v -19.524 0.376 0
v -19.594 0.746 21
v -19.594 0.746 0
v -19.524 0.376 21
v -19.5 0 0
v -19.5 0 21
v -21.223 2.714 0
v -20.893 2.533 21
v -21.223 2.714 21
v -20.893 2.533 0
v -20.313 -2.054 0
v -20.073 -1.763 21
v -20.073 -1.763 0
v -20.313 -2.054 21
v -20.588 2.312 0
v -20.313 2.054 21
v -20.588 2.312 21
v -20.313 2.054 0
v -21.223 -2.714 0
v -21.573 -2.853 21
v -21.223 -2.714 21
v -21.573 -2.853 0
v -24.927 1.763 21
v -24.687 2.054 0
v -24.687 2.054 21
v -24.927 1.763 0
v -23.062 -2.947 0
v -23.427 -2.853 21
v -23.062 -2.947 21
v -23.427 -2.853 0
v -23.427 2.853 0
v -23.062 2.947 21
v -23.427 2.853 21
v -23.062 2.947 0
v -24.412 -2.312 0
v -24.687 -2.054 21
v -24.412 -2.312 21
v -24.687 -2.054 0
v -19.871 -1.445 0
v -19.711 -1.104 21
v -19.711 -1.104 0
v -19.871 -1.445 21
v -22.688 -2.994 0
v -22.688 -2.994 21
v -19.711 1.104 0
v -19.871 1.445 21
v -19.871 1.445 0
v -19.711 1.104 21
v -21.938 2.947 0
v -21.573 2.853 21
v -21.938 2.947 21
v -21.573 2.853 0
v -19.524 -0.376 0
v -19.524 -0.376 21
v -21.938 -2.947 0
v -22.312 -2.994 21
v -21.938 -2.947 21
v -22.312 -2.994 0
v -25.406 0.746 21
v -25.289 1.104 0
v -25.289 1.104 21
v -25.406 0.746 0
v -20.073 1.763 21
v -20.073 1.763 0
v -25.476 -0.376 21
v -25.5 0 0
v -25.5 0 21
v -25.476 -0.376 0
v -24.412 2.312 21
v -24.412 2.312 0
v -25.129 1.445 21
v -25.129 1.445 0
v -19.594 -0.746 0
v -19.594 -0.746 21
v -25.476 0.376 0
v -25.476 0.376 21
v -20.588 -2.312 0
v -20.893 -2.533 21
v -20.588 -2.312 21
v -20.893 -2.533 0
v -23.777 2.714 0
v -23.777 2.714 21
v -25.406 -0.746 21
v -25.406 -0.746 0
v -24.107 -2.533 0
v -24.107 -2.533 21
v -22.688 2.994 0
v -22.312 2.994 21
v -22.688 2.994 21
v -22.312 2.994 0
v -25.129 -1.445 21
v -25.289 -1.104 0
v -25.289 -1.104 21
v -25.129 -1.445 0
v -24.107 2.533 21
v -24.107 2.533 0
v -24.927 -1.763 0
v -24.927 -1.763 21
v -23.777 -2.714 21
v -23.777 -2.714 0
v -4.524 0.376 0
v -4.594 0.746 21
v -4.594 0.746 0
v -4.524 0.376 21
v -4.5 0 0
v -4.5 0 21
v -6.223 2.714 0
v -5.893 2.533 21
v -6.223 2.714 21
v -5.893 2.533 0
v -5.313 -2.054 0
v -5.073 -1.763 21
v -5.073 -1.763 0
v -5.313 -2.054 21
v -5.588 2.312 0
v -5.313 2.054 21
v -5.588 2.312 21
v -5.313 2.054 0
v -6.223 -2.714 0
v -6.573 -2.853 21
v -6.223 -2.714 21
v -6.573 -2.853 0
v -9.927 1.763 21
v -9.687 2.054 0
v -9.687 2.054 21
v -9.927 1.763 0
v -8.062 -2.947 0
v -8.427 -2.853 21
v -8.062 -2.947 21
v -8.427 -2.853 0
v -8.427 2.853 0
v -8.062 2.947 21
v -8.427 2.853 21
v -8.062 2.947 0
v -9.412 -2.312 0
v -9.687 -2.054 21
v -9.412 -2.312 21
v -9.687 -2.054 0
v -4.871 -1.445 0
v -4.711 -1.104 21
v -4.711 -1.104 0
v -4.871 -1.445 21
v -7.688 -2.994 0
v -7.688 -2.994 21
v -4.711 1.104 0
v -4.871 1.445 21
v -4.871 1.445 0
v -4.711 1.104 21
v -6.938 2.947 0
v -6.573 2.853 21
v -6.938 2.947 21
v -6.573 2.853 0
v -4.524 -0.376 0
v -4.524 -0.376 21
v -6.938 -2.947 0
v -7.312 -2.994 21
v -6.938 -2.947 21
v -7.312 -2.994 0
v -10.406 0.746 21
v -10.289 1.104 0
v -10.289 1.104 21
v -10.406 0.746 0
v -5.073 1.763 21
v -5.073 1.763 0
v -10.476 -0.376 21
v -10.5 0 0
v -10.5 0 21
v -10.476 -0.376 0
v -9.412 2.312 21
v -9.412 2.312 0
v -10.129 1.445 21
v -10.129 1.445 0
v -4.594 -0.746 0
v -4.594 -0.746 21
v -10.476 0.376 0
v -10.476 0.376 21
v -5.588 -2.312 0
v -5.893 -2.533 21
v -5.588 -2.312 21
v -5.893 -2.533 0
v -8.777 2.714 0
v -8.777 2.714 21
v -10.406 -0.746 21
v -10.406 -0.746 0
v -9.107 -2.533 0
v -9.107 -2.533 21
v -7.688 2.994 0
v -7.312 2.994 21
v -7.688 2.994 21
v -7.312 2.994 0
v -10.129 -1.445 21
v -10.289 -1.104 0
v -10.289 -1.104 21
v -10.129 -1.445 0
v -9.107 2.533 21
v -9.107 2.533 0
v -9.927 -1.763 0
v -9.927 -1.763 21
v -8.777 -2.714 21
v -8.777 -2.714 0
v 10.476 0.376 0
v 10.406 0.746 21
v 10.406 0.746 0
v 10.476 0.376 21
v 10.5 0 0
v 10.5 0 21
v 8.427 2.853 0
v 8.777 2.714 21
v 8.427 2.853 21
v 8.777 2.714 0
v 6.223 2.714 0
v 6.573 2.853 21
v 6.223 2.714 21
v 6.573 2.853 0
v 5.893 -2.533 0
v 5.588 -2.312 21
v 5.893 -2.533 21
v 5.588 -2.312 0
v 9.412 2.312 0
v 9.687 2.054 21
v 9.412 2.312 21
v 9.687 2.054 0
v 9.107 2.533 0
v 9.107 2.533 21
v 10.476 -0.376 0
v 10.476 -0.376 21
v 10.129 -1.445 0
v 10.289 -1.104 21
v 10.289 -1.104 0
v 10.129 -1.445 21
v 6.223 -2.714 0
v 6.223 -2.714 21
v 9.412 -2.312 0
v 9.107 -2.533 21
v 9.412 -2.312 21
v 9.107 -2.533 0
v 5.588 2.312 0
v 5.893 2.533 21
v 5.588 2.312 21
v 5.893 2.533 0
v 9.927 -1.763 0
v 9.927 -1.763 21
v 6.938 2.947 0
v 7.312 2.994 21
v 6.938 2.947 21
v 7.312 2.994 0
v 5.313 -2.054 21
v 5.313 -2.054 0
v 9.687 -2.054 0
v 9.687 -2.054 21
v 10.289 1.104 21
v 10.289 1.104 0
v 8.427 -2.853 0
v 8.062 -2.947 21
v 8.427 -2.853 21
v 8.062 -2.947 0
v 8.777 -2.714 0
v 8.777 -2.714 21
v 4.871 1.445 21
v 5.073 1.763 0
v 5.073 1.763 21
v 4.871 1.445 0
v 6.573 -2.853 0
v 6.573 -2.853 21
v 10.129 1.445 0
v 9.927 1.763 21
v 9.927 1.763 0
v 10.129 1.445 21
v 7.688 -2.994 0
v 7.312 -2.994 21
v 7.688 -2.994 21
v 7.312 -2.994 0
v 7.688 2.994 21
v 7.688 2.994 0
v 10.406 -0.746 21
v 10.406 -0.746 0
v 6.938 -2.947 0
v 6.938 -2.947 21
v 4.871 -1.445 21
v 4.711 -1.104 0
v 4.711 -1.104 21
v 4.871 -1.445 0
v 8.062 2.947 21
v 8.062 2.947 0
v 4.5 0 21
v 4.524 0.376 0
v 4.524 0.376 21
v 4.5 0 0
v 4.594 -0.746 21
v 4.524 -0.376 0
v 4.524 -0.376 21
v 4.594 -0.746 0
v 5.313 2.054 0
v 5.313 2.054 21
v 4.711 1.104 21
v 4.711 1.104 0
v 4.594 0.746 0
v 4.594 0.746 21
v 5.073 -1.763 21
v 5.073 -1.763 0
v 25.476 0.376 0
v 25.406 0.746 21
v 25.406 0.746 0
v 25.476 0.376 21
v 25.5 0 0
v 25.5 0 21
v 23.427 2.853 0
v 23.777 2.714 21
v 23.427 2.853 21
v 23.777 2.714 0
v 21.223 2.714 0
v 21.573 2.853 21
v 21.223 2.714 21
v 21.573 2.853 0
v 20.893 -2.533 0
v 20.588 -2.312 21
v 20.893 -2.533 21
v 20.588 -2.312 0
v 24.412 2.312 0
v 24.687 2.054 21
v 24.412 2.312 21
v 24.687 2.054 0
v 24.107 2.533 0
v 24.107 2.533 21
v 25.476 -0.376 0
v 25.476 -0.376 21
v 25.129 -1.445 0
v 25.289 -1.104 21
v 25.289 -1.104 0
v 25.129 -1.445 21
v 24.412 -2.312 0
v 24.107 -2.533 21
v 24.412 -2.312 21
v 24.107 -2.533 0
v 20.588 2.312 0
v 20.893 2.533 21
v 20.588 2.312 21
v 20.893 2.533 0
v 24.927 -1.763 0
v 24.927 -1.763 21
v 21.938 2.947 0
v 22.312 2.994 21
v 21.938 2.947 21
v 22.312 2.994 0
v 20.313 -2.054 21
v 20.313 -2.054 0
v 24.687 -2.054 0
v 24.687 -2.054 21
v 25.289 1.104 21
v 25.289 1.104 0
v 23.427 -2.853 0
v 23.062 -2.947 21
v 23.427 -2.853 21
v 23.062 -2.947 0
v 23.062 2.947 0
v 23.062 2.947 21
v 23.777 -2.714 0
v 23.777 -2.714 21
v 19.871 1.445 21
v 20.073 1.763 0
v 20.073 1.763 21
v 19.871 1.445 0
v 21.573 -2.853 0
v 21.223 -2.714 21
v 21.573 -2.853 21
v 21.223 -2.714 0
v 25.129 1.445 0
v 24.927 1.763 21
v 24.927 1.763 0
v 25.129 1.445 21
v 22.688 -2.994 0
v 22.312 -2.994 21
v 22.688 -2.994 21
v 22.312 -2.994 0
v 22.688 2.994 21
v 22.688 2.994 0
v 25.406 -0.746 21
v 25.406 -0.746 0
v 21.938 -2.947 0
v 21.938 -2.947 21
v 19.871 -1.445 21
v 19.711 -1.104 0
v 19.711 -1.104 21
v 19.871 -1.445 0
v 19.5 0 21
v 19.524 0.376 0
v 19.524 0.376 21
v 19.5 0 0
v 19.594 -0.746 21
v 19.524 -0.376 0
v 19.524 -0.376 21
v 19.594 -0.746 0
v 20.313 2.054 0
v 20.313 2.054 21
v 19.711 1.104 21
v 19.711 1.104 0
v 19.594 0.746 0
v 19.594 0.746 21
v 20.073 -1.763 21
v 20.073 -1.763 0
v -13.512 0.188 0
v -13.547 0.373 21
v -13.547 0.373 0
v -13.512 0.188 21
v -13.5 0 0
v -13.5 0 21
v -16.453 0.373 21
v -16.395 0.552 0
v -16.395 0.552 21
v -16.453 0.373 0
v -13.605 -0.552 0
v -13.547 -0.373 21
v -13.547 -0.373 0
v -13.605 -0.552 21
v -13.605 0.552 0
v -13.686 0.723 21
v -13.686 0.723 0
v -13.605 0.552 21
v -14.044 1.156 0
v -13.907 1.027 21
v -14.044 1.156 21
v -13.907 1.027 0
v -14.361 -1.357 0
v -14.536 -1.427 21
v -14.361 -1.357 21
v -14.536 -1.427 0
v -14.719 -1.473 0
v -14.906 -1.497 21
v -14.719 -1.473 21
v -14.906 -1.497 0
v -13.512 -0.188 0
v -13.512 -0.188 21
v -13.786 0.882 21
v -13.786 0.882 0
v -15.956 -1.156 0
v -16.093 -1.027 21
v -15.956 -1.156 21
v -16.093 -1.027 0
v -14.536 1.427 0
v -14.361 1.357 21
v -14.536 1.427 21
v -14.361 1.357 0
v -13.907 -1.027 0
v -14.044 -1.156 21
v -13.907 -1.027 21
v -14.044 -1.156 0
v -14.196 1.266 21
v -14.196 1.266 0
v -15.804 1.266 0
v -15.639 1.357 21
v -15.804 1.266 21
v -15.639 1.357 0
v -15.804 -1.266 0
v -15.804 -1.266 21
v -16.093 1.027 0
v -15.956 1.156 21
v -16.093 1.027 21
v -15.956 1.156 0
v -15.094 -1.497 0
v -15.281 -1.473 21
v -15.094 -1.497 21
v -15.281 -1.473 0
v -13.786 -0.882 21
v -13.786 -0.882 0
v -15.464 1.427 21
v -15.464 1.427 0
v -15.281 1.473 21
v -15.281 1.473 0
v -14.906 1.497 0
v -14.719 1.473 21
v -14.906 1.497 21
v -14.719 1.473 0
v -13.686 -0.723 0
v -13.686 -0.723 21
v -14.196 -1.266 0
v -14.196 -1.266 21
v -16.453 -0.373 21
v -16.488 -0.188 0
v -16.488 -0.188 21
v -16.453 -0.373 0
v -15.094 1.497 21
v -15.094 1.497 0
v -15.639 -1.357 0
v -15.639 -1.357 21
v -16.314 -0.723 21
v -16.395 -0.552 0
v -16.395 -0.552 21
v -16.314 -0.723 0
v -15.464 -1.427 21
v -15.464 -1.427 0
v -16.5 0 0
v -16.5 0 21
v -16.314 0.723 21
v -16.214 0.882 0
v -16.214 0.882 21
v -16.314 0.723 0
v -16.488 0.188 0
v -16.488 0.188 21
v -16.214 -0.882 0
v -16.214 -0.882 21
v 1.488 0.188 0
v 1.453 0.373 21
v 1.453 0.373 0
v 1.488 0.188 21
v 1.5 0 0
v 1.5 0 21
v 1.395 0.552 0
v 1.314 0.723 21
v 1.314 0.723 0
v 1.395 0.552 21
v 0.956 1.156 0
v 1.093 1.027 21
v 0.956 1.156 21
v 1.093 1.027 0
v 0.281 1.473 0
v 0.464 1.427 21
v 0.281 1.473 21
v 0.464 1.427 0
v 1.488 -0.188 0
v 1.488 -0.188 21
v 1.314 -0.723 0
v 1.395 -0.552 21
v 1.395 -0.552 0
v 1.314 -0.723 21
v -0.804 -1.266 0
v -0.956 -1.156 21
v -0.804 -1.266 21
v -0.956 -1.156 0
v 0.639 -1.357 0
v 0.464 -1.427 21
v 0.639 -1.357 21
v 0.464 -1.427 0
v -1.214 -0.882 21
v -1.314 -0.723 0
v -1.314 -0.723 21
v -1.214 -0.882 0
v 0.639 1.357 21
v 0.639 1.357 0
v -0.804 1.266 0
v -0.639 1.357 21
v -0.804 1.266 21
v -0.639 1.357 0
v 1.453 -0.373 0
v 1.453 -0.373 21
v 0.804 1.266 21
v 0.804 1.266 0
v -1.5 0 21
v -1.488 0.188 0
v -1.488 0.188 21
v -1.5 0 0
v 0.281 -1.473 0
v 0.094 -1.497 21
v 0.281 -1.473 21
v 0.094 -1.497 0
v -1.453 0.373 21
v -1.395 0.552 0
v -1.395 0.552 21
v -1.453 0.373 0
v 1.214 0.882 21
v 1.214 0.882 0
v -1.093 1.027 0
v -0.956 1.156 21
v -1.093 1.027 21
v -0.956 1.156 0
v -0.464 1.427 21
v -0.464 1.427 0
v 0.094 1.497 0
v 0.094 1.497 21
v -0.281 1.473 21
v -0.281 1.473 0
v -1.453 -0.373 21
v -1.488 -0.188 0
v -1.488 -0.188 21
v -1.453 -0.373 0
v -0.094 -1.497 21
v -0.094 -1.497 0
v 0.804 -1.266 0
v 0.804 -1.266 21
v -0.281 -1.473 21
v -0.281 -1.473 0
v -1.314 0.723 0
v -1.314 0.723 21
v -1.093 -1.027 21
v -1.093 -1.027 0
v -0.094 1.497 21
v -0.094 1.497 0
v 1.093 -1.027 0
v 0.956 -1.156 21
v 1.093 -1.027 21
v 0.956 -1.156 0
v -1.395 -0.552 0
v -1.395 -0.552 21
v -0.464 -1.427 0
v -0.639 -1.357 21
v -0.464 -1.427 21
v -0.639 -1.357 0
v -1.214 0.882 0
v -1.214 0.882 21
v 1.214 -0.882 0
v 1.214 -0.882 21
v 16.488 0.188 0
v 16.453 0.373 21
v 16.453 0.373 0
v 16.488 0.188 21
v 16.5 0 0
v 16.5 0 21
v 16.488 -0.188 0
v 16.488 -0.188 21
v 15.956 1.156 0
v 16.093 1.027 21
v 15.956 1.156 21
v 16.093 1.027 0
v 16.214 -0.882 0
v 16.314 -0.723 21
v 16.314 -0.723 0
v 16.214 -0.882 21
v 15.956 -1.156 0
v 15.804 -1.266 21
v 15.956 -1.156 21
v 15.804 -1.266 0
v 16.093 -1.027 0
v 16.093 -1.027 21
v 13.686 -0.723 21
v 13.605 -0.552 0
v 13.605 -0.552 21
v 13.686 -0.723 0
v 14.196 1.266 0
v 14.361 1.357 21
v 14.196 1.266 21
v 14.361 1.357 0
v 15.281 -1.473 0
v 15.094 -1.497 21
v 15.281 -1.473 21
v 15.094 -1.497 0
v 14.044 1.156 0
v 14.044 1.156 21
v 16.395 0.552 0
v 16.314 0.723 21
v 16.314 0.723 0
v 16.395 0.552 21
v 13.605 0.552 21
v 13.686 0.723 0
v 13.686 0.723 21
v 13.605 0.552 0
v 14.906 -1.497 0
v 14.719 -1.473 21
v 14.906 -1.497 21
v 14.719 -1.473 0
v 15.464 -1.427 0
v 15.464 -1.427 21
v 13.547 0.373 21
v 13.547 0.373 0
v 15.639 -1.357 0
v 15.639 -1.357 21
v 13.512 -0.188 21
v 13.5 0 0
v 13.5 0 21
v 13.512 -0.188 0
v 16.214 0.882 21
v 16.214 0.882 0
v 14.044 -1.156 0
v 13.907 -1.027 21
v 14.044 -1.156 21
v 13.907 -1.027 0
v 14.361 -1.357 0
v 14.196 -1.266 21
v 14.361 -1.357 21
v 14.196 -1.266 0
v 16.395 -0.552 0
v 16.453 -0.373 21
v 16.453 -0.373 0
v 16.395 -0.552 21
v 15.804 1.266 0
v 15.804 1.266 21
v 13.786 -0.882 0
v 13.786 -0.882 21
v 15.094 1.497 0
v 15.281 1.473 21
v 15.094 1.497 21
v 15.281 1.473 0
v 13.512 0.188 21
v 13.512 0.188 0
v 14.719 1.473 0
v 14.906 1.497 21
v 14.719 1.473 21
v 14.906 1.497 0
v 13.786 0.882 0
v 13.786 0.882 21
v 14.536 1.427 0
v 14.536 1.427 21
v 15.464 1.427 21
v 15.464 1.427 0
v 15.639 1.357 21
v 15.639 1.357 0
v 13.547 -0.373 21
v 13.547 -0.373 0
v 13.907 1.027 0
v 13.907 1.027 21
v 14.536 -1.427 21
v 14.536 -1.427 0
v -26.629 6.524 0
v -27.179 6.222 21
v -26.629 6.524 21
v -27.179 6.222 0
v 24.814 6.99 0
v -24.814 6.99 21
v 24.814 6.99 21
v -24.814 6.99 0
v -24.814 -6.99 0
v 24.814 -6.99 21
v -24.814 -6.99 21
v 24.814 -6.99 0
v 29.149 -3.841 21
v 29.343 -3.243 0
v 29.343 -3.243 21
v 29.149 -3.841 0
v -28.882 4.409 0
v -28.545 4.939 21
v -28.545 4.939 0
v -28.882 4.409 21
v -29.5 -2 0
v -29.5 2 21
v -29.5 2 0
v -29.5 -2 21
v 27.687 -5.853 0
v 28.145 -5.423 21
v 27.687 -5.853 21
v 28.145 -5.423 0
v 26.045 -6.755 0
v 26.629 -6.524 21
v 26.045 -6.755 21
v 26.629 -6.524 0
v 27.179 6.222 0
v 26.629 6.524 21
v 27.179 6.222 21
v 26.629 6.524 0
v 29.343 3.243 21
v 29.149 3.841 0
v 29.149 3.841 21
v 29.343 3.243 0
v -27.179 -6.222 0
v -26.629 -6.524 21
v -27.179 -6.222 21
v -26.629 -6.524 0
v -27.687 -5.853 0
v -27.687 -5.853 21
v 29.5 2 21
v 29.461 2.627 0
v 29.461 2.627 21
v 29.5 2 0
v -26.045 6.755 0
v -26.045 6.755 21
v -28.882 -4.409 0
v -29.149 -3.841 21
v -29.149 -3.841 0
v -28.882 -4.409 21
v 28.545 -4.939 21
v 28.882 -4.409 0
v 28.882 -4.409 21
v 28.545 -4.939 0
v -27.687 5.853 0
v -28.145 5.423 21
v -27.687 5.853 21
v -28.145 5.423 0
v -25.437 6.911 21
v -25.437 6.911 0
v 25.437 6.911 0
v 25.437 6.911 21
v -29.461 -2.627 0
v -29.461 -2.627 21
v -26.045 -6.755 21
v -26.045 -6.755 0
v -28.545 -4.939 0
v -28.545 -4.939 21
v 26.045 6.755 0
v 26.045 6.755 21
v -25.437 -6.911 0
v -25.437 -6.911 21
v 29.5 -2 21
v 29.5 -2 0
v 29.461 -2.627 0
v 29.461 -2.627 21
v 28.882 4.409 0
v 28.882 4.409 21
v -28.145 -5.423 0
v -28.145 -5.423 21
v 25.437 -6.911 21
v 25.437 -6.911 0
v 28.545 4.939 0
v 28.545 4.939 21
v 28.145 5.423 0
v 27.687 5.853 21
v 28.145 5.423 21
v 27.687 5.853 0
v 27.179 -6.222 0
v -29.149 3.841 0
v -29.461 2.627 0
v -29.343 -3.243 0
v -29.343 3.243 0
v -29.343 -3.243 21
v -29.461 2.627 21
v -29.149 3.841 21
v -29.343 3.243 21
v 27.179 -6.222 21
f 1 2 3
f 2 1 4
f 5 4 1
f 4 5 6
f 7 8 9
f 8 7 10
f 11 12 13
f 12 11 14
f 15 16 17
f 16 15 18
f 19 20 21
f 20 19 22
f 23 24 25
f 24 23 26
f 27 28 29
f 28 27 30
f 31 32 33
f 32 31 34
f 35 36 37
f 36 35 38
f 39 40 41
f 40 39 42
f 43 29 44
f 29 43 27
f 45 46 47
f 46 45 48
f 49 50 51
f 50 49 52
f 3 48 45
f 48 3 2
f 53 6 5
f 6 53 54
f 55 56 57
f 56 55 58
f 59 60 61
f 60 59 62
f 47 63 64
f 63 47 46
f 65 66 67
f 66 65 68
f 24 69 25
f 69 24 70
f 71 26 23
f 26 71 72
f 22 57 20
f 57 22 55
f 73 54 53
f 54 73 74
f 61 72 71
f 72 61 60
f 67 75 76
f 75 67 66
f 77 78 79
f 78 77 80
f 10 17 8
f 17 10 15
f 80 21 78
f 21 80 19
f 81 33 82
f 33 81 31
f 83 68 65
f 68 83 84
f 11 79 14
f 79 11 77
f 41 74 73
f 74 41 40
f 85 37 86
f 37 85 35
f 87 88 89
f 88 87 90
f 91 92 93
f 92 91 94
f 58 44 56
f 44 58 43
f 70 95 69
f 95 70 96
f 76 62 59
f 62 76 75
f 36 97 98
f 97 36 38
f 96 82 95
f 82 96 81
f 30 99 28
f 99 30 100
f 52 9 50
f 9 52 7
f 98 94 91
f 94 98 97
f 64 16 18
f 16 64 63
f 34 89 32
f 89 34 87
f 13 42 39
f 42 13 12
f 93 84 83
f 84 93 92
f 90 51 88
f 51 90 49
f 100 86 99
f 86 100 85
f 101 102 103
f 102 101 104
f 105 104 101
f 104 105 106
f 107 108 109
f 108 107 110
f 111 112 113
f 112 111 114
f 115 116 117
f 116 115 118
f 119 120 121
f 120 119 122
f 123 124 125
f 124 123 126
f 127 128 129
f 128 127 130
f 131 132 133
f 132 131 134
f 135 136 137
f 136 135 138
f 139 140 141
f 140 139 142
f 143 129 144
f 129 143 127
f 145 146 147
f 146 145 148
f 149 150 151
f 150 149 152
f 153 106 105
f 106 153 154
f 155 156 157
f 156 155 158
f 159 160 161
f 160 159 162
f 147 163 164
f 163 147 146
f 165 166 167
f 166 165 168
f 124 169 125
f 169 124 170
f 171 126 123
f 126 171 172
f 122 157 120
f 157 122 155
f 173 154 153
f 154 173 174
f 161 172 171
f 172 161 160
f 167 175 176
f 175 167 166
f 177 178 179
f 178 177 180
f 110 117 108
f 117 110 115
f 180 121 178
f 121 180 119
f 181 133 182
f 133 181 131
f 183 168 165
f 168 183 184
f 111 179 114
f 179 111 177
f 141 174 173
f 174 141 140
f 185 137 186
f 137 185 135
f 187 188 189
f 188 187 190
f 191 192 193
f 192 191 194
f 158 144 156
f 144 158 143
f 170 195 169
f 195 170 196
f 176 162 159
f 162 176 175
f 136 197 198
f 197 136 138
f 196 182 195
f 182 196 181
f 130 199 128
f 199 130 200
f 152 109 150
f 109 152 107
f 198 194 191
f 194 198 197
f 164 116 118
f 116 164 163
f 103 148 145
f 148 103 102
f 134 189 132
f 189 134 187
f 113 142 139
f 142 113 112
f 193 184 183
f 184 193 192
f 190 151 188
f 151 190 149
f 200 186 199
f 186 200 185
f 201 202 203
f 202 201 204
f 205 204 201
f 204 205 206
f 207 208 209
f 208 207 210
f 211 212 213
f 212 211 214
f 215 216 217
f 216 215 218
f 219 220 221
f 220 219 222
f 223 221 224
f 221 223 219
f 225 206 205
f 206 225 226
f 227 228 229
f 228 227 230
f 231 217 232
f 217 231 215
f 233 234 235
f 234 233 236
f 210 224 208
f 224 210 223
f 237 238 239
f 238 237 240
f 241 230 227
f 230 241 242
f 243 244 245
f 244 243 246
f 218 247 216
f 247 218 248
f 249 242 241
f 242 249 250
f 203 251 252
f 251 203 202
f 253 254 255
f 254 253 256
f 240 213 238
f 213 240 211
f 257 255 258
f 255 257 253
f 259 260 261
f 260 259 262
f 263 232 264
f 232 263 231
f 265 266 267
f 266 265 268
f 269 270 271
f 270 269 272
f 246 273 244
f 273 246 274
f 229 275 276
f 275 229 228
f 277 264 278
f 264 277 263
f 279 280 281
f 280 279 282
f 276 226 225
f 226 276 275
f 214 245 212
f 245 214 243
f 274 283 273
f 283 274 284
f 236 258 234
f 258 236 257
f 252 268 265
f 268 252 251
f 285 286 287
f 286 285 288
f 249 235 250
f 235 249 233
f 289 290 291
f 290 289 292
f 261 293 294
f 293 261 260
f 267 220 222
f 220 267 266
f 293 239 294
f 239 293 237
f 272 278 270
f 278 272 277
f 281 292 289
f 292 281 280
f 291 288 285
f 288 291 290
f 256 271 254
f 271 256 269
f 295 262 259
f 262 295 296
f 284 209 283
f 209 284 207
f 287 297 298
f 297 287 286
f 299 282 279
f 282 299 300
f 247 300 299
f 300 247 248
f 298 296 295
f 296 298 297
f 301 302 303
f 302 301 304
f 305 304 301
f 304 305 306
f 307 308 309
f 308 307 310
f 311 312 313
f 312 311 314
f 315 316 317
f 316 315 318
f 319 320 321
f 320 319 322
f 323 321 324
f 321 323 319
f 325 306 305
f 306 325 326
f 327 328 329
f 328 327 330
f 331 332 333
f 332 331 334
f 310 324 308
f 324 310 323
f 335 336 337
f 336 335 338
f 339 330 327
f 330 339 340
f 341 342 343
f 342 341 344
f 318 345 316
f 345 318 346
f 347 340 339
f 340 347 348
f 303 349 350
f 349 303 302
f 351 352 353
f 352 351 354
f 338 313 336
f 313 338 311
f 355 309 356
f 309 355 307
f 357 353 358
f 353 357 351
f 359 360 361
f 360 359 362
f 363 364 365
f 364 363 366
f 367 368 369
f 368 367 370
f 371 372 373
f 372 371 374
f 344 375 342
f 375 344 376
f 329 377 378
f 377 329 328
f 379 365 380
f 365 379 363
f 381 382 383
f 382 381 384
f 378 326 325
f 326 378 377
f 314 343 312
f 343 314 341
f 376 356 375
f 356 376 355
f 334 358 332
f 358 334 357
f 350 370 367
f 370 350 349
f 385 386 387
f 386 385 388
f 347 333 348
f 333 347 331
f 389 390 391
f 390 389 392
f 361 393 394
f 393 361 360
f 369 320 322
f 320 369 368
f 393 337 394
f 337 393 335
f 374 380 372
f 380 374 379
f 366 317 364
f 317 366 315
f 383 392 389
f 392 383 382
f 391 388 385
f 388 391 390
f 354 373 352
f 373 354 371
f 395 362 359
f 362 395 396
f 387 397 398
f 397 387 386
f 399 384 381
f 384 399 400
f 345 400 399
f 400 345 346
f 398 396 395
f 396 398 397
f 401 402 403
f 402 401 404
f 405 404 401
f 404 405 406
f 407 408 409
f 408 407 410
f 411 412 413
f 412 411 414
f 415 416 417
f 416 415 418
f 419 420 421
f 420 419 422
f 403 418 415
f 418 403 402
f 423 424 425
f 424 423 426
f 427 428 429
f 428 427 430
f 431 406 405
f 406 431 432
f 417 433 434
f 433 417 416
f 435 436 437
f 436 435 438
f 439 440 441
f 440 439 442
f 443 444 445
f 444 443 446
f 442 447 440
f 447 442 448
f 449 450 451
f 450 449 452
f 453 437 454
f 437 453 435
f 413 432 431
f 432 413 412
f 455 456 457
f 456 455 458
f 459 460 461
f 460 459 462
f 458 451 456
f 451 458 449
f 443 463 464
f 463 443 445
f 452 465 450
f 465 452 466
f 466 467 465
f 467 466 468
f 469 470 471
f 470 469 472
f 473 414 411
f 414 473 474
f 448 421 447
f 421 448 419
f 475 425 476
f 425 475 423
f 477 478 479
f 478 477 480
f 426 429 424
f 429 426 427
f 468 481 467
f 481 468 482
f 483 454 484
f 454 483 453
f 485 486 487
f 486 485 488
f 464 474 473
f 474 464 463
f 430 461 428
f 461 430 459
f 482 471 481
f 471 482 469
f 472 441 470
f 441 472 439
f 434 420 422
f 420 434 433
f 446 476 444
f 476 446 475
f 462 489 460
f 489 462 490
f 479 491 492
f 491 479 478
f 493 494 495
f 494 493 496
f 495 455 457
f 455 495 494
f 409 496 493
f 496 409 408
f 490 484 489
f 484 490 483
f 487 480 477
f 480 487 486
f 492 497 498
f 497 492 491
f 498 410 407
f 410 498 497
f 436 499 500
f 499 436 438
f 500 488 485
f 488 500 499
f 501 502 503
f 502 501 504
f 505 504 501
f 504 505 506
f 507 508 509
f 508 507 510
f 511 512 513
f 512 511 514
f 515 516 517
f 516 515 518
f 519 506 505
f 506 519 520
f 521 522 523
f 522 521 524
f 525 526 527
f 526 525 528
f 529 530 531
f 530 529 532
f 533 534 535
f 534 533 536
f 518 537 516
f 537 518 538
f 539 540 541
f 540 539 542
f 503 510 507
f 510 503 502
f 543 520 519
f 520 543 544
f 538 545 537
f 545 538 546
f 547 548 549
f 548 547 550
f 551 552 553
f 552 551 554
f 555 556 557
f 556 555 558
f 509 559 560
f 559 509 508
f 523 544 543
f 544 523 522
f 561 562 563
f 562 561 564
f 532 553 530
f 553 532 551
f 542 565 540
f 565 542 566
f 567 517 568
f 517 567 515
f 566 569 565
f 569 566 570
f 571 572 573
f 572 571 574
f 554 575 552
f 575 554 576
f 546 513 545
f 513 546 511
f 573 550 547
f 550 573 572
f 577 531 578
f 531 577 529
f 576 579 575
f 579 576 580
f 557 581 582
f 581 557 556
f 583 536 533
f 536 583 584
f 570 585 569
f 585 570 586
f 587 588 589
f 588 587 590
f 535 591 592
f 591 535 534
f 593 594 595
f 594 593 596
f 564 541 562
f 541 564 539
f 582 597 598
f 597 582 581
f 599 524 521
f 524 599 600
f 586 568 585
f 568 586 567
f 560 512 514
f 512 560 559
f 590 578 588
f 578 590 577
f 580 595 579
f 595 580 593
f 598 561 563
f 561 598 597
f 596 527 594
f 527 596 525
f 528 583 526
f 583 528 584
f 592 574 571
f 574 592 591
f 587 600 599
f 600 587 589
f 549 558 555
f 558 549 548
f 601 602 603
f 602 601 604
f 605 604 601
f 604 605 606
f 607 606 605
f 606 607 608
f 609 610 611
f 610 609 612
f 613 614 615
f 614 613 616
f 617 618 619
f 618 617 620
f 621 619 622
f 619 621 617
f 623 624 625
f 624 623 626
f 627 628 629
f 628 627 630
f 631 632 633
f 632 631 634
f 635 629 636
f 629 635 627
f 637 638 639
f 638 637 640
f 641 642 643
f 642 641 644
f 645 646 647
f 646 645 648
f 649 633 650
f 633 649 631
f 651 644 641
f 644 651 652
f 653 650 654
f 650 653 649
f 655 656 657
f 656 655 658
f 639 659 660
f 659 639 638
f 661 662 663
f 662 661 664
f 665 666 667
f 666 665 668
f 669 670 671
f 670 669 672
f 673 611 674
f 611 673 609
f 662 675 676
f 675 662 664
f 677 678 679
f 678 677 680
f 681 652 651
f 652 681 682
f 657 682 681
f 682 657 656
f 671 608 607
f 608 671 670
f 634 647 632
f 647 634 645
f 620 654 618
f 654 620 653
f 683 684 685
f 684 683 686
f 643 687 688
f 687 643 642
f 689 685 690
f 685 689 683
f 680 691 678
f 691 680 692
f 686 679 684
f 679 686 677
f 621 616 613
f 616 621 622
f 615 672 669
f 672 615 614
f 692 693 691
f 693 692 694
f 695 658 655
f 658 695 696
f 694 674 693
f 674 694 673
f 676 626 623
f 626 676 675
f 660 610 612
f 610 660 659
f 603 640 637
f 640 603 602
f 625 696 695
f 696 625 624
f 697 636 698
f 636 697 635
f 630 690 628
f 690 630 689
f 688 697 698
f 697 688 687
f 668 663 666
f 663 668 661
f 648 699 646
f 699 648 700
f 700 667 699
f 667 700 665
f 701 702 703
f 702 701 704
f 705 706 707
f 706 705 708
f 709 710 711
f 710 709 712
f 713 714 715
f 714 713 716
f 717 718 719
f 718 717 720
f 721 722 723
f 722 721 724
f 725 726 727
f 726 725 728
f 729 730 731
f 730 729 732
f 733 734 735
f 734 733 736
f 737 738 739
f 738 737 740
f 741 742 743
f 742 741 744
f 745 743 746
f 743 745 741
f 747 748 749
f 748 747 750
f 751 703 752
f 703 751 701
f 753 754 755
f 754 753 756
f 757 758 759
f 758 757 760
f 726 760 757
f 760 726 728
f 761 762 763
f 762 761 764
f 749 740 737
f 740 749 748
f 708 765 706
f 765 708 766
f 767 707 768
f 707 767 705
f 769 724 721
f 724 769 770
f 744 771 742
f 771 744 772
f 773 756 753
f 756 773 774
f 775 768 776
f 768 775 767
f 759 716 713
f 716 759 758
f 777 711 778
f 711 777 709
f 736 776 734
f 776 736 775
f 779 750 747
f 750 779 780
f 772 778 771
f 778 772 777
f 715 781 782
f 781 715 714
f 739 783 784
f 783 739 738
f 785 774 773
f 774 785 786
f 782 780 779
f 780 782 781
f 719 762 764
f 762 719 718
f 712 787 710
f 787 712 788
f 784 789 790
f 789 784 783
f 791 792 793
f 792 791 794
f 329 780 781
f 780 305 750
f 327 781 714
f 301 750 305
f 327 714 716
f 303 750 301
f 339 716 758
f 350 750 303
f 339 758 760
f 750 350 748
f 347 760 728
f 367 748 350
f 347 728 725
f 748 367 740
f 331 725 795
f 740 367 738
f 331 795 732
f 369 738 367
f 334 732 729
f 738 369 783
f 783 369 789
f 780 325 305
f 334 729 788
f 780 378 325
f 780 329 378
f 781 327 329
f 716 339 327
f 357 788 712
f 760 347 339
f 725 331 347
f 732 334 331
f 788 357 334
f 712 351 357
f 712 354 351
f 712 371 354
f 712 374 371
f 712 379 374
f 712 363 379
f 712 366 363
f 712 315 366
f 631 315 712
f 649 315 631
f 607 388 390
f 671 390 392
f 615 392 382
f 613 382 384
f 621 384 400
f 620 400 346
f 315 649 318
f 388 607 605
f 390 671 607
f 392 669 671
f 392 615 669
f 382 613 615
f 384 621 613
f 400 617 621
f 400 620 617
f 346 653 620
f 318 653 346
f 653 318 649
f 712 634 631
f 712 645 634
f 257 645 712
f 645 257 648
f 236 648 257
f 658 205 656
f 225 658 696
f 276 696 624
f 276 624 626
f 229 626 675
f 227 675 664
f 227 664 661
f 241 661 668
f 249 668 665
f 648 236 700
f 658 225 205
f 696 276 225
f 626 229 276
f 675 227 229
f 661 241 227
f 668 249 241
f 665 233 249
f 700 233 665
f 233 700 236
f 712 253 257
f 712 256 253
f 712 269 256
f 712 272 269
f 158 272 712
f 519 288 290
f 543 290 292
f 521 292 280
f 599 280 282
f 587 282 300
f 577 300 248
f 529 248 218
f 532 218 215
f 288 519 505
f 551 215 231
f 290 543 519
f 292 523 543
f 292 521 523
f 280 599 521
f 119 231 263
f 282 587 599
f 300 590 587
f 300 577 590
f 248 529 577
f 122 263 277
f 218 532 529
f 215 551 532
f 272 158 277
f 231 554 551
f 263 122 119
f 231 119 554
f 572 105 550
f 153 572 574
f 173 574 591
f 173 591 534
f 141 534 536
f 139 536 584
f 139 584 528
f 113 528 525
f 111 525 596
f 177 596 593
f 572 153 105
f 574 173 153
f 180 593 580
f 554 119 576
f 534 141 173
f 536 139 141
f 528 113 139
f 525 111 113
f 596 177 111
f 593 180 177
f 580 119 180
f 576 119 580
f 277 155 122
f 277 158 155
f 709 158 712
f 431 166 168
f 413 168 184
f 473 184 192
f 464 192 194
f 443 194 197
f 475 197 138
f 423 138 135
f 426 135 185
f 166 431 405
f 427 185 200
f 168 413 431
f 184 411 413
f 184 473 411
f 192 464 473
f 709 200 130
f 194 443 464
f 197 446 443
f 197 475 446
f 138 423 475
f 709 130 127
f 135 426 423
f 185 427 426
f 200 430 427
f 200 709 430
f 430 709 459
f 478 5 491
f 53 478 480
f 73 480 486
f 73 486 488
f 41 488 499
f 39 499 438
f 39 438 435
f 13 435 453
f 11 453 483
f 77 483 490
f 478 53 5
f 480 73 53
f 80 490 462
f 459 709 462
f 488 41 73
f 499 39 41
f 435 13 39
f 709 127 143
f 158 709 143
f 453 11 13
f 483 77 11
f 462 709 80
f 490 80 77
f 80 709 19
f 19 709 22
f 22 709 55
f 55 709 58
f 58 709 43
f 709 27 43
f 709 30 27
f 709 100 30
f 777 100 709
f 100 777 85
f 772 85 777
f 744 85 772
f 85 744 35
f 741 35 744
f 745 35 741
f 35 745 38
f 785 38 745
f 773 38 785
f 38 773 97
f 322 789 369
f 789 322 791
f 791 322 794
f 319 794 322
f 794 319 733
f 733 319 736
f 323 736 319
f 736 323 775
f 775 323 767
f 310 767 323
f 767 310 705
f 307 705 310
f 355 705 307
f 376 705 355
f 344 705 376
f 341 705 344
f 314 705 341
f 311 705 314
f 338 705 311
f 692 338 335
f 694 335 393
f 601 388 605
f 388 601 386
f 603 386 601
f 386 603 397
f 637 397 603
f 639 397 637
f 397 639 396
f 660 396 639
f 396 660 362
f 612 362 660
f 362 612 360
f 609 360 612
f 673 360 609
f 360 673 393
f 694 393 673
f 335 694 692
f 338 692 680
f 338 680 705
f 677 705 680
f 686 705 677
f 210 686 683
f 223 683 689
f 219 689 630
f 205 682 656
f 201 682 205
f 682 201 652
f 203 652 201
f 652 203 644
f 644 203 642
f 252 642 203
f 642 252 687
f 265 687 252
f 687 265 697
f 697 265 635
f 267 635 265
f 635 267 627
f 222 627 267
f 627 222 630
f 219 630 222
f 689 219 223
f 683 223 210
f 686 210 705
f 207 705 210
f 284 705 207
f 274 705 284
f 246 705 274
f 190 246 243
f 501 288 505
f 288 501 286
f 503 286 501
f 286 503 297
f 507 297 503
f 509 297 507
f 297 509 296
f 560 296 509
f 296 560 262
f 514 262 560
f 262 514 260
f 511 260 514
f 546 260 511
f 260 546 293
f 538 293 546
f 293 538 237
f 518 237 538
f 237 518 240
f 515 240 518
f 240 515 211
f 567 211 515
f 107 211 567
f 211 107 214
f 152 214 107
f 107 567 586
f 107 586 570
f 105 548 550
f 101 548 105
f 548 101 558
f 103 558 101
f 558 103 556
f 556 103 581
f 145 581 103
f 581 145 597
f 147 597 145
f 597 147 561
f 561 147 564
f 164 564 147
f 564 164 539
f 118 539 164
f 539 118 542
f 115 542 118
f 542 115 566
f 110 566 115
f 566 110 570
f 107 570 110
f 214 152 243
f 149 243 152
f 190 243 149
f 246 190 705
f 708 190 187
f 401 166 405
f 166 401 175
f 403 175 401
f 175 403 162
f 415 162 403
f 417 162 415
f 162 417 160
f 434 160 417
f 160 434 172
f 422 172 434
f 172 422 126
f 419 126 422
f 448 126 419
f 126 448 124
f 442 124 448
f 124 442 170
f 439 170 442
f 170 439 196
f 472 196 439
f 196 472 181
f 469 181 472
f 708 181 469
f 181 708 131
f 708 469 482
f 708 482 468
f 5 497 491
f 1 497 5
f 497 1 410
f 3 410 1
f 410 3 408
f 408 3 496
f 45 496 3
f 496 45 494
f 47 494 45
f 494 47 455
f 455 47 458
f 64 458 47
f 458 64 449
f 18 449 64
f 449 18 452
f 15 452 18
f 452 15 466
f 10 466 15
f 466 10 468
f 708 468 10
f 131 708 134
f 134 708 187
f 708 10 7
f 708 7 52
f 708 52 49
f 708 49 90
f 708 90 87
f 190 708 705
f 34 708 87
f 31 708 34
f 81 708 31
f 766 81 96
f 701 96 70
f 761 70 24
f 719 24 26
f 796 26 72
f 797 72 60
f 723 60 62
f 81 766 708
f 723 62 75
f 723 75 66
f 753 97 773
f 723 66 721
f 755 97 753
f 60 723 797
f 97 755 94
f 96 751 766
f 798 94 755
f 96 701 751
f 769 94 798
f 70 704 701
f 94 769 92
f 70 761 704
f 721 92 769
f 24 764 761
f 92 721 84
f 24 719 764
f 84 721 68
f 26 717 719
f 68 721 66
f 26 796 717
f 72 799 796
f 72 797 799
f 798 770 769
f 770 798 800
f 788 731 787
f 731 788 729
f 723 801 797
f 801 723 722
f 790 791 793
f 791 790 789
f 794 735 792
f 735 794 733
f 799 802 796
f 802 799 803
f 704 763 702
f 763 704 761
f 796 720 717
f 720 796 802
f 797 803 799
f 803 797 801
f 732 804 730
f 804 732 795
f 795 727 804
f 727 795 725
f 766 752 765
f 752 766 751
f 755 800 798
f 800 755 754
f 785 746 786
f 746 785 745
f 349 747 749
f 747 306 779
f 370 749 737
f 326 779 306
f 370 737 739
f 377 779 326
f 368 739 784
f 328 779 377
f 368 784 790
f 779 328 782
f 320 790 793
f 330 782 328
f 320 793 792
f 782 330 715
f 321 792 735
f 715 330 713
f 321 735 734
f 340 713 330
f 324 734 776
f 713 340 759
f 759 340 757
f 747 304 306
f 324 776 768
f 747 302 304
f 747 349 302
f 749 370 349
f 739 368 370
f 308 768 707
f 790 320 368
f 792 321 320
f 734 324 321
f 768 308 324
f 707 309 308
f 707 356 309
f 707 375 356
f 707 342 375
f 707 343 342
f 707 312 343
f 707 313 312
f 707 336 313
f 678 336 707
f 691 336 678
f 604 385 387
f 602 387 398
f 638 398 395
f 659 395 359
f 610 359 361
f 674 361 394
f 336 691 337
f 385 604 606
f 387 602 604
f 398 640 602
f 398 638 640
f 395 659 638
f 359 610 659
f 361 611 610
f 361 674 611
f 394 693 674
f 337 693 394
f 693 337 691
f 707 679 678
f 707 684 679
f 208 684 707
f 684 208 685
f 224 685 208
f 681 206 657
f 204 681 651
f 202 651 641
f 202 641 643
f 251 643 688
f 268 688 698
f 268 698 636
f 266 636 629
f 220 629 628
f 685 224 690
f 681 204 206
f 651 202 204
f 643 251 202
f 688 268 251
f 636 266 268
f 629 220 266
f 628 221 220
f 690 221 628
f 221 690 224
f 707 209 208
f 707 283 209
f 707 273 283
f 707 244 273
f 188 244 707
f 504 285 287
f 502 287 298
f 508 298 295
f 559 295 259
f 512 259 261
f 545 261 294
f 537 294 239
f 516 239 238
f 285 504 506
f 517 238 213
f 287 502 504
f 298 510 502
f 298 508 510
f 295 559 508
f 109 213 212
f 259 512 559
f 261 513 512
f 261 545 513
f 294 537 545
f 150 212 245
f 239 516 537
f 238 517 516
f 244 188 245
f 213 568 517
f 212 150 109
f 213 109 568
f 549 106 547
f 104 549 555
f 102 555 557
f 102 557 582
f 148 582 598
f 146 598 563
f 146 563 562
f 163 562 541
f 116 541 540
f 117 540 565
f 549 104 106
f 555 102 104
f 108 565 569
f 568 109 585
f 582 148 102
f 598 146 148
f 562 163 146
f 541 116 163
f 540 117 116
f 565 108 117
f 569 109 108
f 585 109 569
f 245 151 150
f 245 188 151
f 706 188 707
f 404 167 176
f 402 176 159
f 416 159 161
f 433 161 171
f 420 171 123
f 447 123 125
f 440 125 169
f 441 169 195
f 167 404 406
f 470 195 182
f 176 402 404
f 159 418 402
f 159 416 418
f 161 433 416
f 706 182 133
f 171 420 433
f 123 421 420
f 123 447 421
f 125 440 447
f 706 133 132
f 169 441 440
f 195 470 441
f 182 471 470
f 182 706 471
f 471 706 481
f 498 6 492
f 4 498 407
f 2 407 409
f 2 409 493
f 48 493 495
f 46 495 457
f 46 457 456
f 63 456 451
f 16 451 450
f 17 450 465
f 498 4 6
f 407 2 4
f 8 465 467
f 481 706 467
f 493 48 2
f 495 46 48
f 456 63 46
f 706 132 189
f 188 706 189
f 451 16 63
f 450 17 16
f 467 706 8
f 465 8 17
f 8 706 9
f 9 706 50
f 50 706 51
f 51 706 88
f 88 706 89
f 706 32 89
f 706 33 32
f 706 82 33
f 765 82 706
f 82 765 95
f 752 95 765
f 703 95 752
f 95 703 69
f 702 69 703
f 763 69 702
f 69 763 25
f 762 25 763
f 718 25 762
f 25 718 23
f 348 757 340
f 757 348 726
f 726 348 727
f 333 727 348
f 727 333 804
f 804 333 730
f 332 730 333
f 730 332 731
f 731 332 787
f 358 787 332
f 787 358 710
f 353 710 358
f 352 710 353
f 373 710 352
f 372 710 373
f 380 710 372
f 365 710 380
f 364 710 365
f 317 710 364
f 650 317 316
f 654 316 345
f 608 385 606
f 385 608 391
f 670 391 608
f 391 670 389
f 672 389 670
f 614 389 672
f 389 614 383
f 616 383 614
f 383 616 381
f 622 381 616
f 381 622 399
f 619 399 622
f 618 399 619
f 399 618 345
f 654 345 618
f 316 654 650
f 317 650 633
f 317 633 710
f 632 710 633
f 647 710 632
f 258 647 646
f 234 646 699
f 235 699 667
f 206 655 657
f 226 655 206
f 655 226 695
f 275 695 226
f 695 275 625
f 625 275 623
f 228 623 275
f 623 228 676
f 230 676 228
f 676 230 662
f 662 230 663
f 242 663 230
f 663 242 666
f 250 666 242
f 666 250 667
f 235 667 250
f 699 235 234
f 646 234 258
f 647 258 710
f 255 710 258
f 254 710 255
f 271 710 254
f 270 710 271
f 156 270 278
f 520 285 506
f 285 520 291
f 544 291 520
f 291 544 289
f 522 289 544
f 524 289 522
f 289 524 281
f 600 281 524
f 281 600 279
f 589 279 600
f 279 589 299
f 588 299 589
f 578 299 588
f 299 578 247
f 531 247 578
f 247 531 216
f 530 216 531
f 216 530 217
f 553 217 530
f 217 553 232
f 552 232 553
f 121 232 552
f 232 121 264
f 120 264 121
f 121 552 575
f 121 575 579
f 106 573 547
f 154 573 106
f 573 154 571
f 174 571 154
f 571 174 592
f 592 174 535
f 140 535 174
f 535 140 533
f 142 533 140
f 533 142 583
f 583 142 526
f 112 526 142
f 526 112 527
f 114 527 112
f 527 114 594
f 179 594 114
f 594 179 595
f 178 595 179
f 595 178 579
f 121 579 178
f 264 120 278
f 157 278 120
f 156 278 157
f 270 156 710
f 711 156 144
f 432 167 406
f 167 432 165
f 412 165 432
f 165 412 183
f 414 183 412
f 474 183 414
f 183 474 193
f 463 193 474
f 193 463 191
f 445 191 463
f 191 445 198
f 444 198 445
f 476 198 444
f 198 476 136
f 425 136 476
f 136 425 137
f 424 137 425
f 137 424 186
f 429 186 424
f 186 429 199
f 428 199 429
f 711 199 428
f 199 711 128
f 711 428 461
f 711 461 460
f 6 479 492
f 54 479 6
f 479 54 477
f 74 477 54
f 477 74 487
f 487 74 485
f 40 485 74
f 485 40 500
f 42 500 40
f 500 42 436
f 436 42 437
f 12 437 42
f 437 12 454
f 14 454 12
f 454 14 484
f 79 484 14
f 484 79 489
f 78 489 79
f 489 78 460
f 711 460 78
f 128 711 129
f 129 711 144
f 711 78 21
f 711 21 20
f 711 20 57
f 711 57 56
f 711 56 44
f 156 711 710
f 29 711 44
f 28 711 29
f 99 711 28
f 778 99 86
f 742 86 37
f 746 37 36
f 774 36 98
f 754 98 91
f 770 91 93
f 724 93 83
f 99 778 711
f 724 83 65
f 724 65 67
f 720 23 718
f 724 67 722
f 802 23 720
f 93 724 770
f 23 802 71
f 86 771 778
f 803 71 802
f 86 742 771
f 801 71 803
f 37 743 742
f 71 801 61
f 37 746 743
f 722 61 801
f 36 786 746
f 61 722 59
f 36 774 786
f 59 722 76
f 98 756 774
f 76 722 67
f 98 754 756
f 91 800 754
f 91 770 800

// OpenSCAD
$fn = 50;


difference() {
	union() {
		*color(alpha = 1.0000000000, c = "gray") {
			translate(v = [0, 7, 0]) {
				linear_extrude(height = 1) {
					text(font = "Arial:style=Bold", halign = "center", size = 4.5000000000, text = "COMMENT plate main", valign = "center");
				}
			}
		}
		hull() {
			translate(v = [-24.5000000000, 2.0000000000, 0]) {
				cylinder(h = 21, r = 5);
			}
			translate(v = [24.5000000000, 2.0000000000, 0]) {
				cylinder(h = 21, r = 5);
			}
			translate(v = [-24.5000000000, -2.0000000000, 0]) {
				cylinder(h = 21, r = 5);
			}
			translate(v = [24.5000000000, -2.0000000000, 0]) {
				cylinder(h = 21, r = 5);
			}
		}
	}
	union() {
		*color(alpha = 1.0000000000, c = "gray") {
			translate(v = [0, 7, 0]) {
				linear_extrude(height = 1) {
					text(font = "Arial:style=Bold", halign = "center", size = 4.5000000000, text = "COMMENT holes main", valign = "center");
				}
			}
		}
		translate(v = [-22.5000000000, 0.0000000000, 0]) {
			translate(v = [0, 0, -100]) {
				cylinder(h = 200, r = 3.0000000000);
			}
		}
		translate(v = [-7.5000000000, 0.0000000000, 0]) {
			translate(v = [0, 0, -100]) {
				cylinder(h = 200, r = 3.0000000000);
			}
		}
		translate(v = [7.5000000000, 0.0000000000, 0]) {
			translate(v = [0, 0, -100]) {
				cylinder(h = 200, r = 3.0000000000);
			}
		}
		translate(v = [22.5000000000, 0.0000000000, 0]) {
			translate(v = [0, 0, -100]) {
				cylinder(h = 200, r = 3.0000000000);
			}
		}
		translate(v = [-22.5000000000, 0.0000000000, 0]) {
			translate(v = [0, 0, -100]) {
				cylinder(h = 200, r = 1.5000000000);
			}
		}
		translate(v = [-15.0000000000, 0.0000000000, 0]) {
			translate(v = [0, 0, -100]) {
				cylinder(h = 200, r = 1.5000000000);
			}
		}
		translate(v = [-7.5000000000, 0.0000000000, 0]) {
			translate(v = [0, 0, -100]) {
				cylinder(h = 200, r = 1.5000000000);
			}
		}
		translate(v = [0, 0, -100]) {
			cylinder(h = 200, r = 1.5000000000);
		}
		translate(v = [7.5000000000, 0.0000000000, 0]) {
			translate(v = [0, 0, -100]) {
				cylinder(h = 200, r = 1.5000000000);
			}
		}
		translate(v = [15.0000000000, 0.0000000000, 0]) {
			translate(v = [0, 0, -100]) {
				cylinder(h = 200, r = 1.5000000000);
			}
		}
		translate(v = [22.5000000000, 0.0000000000, 0]) {
			translate(v = [0, 0, -100]) {
				cylinder(h = 200, r = 1.5000000000);
			}
		}
	}
}
